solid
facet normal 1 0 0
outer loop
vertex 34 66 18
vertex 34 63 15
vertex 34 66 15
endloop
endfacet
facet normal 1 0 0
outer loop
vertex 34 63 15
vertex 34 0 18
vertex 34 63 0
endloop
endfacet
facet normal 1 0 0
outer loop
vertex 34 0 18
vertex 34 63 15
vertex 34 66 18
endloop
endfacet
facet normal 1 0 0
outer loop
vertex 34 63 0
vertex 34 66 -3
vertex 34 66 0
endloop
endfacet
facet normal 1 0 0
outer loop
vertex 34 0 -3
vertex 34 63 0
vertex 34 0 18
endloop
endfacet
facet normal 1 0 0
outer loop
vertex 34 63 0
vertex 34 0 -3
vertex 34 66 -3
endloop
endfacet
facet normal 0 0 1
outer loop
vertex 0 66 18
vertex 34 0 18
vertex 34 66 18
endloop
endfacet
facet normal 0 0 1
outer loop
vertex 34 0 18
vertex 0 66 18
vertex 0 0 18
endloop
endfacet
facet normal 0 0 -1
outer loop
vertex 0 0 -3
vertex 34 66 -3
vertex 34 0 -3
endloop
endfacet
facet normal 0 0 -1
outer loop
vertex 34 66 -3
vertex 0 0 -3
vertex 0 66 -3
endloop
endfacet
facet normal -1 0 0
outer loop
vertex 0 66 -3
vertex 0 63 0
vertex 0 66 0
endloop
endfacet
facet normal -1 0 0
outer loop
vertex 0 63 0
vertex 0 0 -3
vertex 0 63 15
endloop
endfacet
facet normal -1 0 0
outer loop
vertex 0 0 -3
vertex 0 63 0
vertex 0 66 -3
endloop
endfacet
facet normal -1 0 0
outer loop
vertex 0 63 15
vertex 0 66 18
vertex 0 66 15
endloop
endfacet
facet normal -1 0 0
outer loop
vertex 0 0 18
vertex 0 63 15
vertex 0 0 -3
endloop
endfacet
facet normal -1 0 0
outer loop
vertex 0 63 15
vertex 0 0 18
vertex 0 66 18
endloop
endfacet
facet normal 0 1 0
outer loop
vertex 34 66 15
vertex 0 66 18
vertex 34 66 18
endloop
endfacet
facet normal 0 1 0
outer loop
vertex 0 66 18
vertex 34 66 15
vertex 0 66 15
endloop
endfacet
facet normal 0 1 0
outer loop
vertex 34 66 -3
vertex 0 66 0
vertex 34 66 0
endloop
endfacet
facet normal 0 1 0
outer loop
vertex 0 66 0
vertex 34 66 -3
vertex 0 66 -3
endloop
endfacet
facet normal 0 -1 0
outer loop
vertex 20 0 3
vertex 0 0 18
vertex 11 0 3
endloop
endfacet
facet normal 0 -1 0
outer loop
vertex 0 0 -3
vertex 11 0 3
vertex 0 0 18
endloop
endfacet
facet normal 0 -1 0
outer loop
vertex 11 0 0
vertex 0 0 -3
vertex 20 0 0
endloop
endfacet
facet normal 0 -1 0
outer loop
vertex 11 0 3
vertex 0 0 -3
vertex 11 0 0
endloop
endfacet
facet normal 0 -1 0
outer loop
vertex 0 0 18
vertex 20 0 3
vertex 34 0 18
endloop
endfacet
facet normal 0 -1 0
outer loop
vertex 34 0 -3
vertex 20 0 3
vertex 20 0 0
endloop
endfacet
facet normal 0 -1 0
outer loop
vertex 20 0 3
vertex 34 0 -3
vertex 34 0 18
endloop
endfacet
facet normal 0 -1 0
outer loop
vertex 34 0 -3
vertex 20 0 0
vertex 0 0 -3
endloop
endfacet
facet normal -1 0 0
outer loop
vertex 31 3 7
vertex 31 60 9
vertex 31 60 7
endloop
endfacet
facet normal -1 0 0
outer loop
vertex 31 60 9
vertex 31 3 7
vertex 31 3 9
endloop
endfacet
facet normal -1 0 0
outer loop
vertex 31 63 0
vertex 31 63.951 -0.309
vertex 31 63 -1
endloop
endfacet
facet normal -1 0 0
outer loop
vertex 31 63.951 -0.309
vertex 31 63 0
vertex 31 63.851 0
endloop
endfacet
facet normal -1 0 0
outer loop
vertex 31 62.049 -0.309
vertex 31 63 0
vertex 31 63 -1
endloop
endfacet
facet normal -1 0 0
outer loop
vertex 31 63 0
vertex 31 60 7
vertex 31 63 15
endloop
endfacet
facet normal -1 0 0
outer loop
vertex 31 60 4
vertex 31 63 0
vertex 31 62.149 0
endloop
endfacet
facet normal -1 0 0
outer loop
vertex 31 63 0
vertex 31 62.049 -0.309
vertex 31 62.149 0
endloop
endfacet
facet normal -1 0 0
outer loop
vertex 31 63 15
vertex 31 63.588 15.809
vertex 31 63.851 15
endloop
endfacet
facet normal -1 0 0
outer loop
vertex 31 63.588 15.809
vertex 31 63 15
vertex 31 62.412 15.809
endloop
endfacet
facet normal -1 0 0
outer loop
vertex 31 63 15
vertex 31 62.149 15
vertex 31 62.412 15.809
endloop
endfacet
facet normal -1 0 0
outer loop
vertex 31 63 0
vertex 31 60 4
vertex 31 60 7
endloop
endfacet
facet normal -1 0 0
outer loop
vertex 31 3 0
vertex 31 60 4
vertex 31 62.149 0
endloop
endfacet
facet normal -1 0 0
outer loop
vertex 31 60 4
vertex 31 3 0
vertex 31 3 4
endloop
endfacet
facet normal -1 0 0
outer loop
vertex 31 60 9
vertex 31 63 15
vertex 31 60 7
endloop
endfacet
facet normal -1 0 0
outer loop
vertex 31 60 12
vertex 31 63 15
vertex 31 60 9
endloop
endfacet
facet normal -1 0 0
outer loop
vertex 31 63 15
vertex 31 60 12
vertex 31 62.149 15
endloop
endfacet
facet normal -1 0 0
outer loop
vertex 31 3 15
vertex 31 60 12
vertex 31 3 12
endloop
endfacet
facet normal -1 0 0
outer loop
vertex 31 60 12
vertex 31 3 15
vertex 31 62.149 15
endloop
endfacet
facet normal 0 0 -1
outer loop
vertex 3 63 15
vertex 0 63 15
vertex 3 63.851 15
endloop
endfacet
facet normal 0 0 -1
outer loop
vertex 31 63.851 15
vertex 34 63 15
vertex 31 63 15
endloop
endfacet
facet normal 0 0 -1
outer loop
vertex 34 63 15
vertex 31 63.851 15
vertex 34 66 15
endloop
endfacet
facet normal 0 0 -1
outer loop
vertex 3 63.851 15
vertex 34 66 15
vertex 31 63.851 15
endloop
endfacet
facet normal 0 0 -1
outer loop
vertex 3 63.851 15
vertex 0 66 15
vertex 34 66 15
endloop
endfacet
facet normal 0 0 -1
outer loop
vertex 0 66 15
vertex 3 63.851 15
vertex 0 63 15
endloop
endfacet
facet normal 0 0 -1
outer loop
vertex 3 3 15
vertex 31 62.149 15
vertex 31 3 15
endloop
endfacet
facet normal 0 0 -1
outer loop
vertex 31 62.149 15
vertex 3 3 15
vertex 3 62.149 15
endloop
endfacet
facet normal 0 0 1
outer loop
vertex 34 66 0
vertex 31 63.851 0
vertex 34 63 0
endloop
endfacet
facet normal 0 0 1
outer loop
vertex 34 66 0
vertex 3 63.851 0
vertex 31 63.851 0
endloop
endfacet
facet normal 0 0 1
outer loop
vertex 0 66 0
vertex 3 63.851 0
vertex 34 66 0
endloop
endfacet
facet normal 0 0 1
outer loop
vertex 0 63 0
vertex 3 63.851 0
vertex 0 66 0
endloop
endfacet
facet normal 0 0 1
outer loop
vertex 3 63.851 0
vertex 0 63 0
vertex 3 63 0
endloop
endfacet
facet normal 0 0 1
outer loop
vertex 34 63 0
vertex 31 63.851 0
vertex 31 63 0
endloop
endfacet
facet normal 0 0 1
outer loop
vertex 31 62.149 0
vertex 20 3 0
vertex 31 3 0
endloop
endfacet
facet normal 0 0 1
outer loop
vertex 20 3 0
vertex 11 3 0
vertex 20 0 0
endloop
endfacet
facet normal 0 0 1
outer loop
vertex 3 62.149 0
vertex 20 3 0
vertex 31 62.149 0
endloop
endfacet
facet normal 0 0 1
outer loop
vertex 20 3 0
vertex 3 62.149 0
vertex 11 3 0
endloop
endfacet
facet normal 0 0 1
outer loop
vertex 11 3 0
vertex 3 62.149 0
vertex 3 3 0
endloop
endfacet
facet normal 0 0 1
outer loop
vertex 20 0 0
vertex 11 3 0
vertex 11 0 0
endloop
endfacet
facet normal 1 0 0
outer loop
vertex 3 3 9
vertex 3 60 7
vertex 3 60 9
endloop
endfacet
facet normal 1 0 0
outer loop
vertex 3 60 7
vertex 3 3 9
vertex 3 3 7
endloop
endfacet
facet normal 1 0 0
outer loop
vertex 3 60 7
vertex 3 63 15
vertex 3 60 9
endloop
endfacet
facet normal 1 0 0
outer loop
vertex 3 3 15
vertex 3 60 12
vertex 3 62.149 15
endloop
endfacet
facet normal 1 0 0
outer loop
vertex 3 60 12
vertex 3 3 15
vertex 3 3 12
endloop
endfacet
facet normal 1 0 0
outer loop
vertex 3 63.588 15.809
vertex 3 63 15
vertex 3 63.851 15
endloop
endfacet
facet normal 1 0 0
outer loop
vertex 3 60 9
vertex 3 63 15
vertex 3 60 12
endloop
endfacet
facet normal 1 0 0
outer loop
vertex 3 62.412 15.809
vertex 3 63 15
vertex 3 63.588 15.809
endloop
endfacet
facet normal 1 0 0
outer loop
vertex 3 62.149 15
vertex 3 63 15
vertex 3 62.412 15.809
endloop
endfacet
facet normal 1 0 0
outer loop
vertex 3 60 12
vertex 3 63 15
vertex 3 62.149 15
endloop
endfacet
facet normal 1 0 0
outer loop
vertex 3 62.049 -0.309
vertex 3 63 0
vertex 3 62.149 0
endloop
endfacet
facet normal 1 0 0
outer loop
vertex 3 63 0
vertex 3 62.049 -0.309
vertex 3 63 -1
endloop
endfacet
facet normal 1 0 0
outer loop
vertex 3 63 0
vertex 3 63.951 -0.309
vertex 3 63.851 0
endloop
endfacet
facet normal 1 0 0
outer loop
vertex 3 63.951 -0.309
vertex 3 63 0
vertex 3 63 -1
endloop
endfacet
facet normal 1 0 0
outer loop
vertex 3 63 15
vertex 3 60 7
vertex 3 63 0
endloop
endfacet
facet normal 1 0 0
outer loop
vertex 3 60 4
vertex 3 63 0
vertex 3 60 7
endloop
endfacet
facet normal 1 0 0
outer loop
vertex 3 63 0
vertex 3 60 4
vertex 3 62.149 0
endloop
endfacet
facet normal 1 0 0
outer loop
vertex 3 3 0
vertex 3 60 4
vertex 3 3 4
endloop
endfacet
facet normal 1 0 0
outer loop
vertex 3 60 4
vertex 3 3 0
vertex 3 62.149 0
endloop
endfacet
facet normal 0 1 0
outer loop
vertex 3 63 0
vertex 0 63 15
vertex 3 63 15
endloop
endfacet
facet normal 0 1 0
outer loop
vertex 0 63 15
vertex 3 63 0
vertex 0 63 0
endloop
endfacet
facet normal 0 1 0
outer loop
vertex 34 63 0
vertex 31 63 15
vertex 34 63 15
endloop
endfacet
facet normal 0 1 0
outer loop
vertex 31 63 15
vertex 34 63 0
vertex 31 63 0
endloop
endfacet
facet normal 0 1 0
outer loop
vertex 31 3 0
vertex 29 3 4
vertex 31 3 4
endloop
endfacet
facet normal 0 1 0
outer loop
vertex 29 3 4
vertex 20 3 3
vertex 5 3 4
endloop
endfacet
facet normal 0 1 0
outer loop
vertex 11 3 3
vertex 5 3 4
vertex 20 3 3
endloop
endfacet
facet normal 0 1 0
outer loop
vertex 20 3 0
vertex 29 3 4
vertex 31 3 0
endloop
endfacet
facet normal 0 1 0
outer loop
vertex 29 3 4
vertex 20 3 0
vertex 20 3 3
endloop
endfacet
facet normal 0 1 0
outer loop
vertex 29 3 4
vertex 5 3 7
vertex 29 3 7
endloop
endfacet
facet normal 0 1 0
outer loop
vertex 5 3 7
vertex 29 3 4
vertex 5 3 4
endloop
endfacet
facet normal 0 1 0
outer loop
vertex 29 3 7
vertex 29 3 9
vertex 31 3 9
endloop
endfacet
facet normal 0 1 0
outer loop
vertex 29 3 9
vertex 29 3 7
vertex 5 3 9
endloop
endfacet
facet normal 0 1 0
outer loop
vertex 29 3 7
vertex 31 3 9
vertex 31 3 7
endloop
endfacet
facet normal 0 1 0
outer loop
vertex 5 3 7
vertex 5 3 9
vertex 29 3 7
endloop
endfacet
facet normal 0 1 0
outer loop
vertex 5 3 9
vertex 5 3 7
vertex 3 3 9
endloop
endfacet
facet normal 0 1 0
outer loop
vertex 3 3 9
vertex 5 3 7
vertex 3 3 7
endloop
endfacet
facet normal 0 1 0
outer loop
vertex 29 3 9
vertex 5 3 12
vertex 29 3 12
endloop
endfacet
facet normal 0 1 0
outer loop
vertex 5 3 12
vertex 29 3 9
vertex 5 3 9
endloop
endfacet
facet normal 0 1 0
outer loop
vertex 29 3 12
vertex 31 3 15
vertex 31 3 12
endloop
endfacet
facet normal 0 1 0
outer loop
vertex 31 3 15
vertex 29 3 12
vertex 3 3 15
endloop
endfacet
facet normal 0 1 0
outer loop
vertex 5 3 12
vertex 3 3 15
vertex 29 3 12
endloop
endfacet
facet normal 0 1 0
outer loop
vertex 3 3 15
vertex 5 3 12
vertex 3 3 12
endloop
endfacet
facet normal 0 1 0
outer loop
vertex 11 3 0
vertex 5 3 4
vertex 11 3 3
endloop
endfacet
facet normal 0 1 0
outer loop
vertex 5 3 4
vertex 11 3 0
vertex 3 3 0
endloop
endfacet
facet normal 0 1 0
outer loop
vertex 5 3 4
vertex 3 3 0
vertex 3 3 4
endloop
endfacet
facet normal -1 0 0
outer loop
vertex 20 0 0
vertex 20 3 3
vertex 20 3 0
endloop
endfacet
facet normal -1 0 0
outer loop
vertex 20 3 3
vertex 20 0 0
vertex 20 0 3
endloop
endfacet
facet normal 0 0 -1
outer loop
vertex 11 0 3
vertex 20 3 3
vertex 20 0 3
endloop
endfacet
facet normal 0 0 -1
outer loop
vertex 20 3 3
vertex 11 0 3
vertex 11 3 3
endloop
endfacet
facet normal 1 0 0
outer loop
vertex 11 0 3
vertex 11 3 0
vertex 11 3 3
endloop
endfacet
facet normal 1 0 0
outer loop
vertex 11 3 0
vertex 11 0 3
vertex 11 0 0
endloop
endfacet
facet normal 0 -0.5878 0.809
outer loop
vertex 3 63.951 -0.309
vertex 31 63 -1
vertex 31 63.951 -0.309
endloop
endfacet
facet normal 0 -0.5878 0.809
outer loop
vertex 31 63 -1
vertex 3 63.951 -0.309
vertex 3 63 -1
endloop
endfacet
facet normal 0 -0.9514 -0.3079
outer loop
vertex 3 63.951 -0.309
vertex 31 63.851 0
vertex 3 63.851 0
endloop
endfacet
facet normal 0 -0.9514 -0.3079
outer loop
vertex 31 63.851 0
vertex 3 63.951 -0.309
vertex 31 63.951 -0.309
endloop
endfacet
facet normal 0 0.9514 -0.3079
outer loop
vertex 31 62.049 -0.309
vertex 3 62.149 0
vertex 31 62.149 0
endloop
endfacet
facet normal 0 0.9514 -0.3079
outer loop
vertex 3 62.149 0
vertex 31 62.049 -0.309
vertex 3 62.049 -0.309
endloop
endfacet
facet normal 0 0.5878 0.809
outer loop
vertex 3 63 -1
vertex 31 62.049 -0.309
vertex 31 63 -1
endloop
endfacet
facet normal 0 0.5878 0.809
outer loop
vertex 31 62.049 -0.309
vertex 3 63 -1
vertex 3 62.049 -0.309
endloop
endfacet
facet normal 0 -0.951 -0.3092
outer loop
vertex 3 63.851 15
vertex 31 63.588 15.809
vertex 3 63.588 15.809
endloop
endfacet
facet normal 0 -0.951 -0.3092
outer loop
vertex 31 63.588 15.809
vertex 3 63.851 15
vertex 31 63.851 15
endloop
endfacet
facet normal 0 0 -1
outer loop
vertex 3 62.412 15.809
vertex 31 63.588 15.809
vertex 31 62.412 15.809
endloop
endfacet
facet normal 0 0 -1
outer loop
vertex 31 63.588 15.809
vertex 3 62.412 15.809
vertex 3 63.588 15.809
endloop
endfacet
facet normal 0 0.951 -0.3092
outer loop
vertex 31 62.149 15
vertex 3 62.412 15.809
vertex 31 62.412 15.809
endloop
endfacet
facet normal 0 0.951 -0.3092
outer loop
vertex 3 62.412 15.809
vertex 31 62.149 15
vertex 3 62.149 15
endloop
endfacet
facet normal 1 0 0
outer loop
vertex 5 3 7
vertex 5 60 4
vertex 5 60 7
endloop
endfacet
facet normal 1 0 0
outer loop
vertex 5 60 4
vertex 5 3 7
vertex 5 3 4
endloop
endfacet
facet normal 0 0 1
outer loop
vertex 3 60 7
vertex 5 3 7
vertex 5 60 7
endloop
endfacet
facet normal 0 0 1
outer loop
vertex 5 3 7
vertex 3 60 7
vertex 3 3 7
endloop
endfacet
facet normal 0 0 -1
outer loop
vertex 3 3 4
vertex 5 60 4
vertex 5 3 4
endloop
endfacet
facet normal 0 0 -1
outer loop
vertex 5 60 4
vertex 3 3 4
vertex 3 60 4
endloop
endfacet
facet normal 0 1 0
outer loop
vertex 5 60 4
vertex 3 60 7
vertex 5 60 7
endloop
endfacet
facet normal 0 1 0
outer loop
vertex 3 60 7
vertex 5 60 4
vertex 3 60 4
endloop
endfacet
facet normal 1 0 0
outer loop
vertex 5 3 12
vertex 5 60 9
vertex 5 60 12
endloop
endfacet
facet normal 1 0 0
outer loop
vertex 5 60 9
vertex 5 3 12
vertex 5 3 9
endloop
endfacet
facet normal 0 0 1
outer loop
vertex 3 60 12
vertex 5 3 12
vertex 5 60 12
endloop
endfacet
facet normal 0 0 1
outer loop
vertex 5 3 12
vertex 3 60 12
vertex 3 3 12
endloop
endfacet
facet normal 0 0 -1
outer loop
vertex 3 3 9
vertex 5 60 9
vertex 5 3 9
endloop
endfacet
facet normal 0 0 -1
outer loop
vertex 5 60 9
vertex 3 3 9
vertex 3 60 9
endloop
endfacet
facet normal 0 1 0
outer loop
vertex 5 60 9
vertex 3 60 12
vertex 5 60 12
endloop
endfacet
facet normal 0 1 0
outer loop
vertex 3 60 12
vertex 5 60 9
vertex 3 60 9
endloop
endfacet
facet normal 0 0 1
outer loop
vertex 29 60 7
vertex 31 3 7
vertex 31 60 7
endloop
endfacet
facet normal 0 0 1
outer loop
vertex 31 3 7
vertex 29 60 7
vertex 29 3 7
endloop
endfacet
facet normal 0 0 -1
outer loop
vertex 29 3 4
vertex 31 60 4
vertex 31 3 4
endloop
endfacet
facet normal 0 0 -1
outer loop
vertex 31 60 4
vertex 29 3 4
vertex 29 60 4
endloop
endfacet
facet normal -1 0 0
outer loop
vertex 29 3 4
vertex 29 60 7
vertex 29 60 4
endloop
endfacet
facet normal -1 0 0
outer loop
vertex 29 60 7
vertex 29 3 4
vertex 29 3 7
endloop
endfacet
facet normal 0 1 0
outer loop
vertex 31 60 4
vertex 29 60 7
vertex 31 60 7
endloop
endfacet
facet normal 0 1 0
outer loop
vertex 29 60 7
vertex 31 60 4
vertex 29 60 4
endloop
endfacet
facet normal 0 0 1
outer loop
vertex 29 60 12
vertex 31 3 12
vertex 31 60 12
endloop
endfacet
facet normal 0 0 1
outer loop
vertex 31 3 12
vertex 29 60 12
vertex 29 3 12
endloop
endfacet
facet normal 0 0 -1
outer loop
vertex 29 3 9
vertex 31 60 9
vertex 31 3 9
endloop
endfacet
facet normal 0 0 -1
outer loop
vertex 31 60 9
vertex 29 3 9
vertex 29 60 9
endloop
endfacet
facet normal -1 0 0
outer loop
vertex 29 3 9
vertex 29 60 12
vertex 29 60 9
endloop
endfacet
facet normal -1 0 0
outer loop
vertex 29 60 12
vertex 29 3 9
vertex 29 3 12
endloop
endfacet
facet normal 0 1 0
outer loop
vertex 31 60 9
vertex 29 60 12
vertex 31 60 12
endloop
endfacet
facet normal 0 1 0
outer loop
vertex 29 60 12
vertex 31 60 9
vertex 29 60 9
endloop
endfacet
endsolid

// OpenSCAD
//pls don't judge too much
//my first .scad file

hyla=6;
hala=7;
h=hyla + hala + 2;
w=28;
l=60;
wall=3;

sisa =  [w,l,h];
ulko = [for (i = sisa) i+6];
usb = [9,4,wall];

module cube1(){
    difference() {
        translate ([0,0,-wall])cube(ulko);
        translate([wall,wall,0]) cube(sisa);
        }
}

module cube2(){
difference(){
    cube1();
    translate([8+wall,0,0]) cube(usb);
    }

}
module cube3(){
difference(){
    cube2();
    translate([0,(l+wall),0]) 
cube([100,100,h]);
    }
}

module cube3(){
difference(){
    cube2();
    translate([0,(l+wall),0]) 
cube([100,100,h]);
    }
}

module cube4(){
difference(){
    cube3();
    rotate([0,90,0])
    translate([0,(l+wall),wall]) 
    cylinder(r=1,h=w);
    }
}

module cube5(){
difference(){
    cube4();
    rotate([0,90,0])
    translate([-h,(l+wall),wall]) 
    cylinder(r=1,h=w);
    }
}

cube5();
translate([2,0,hala - wall]) cube([wall,l,wall]);
translate([2,0,h-hyla]) cube([wall,l,wall]);

translate([w+1,0,hala - wall]) cube([wall,l,wall]);
translate([w+1,0,h-hyla]) cube([wall,l,wall]);
